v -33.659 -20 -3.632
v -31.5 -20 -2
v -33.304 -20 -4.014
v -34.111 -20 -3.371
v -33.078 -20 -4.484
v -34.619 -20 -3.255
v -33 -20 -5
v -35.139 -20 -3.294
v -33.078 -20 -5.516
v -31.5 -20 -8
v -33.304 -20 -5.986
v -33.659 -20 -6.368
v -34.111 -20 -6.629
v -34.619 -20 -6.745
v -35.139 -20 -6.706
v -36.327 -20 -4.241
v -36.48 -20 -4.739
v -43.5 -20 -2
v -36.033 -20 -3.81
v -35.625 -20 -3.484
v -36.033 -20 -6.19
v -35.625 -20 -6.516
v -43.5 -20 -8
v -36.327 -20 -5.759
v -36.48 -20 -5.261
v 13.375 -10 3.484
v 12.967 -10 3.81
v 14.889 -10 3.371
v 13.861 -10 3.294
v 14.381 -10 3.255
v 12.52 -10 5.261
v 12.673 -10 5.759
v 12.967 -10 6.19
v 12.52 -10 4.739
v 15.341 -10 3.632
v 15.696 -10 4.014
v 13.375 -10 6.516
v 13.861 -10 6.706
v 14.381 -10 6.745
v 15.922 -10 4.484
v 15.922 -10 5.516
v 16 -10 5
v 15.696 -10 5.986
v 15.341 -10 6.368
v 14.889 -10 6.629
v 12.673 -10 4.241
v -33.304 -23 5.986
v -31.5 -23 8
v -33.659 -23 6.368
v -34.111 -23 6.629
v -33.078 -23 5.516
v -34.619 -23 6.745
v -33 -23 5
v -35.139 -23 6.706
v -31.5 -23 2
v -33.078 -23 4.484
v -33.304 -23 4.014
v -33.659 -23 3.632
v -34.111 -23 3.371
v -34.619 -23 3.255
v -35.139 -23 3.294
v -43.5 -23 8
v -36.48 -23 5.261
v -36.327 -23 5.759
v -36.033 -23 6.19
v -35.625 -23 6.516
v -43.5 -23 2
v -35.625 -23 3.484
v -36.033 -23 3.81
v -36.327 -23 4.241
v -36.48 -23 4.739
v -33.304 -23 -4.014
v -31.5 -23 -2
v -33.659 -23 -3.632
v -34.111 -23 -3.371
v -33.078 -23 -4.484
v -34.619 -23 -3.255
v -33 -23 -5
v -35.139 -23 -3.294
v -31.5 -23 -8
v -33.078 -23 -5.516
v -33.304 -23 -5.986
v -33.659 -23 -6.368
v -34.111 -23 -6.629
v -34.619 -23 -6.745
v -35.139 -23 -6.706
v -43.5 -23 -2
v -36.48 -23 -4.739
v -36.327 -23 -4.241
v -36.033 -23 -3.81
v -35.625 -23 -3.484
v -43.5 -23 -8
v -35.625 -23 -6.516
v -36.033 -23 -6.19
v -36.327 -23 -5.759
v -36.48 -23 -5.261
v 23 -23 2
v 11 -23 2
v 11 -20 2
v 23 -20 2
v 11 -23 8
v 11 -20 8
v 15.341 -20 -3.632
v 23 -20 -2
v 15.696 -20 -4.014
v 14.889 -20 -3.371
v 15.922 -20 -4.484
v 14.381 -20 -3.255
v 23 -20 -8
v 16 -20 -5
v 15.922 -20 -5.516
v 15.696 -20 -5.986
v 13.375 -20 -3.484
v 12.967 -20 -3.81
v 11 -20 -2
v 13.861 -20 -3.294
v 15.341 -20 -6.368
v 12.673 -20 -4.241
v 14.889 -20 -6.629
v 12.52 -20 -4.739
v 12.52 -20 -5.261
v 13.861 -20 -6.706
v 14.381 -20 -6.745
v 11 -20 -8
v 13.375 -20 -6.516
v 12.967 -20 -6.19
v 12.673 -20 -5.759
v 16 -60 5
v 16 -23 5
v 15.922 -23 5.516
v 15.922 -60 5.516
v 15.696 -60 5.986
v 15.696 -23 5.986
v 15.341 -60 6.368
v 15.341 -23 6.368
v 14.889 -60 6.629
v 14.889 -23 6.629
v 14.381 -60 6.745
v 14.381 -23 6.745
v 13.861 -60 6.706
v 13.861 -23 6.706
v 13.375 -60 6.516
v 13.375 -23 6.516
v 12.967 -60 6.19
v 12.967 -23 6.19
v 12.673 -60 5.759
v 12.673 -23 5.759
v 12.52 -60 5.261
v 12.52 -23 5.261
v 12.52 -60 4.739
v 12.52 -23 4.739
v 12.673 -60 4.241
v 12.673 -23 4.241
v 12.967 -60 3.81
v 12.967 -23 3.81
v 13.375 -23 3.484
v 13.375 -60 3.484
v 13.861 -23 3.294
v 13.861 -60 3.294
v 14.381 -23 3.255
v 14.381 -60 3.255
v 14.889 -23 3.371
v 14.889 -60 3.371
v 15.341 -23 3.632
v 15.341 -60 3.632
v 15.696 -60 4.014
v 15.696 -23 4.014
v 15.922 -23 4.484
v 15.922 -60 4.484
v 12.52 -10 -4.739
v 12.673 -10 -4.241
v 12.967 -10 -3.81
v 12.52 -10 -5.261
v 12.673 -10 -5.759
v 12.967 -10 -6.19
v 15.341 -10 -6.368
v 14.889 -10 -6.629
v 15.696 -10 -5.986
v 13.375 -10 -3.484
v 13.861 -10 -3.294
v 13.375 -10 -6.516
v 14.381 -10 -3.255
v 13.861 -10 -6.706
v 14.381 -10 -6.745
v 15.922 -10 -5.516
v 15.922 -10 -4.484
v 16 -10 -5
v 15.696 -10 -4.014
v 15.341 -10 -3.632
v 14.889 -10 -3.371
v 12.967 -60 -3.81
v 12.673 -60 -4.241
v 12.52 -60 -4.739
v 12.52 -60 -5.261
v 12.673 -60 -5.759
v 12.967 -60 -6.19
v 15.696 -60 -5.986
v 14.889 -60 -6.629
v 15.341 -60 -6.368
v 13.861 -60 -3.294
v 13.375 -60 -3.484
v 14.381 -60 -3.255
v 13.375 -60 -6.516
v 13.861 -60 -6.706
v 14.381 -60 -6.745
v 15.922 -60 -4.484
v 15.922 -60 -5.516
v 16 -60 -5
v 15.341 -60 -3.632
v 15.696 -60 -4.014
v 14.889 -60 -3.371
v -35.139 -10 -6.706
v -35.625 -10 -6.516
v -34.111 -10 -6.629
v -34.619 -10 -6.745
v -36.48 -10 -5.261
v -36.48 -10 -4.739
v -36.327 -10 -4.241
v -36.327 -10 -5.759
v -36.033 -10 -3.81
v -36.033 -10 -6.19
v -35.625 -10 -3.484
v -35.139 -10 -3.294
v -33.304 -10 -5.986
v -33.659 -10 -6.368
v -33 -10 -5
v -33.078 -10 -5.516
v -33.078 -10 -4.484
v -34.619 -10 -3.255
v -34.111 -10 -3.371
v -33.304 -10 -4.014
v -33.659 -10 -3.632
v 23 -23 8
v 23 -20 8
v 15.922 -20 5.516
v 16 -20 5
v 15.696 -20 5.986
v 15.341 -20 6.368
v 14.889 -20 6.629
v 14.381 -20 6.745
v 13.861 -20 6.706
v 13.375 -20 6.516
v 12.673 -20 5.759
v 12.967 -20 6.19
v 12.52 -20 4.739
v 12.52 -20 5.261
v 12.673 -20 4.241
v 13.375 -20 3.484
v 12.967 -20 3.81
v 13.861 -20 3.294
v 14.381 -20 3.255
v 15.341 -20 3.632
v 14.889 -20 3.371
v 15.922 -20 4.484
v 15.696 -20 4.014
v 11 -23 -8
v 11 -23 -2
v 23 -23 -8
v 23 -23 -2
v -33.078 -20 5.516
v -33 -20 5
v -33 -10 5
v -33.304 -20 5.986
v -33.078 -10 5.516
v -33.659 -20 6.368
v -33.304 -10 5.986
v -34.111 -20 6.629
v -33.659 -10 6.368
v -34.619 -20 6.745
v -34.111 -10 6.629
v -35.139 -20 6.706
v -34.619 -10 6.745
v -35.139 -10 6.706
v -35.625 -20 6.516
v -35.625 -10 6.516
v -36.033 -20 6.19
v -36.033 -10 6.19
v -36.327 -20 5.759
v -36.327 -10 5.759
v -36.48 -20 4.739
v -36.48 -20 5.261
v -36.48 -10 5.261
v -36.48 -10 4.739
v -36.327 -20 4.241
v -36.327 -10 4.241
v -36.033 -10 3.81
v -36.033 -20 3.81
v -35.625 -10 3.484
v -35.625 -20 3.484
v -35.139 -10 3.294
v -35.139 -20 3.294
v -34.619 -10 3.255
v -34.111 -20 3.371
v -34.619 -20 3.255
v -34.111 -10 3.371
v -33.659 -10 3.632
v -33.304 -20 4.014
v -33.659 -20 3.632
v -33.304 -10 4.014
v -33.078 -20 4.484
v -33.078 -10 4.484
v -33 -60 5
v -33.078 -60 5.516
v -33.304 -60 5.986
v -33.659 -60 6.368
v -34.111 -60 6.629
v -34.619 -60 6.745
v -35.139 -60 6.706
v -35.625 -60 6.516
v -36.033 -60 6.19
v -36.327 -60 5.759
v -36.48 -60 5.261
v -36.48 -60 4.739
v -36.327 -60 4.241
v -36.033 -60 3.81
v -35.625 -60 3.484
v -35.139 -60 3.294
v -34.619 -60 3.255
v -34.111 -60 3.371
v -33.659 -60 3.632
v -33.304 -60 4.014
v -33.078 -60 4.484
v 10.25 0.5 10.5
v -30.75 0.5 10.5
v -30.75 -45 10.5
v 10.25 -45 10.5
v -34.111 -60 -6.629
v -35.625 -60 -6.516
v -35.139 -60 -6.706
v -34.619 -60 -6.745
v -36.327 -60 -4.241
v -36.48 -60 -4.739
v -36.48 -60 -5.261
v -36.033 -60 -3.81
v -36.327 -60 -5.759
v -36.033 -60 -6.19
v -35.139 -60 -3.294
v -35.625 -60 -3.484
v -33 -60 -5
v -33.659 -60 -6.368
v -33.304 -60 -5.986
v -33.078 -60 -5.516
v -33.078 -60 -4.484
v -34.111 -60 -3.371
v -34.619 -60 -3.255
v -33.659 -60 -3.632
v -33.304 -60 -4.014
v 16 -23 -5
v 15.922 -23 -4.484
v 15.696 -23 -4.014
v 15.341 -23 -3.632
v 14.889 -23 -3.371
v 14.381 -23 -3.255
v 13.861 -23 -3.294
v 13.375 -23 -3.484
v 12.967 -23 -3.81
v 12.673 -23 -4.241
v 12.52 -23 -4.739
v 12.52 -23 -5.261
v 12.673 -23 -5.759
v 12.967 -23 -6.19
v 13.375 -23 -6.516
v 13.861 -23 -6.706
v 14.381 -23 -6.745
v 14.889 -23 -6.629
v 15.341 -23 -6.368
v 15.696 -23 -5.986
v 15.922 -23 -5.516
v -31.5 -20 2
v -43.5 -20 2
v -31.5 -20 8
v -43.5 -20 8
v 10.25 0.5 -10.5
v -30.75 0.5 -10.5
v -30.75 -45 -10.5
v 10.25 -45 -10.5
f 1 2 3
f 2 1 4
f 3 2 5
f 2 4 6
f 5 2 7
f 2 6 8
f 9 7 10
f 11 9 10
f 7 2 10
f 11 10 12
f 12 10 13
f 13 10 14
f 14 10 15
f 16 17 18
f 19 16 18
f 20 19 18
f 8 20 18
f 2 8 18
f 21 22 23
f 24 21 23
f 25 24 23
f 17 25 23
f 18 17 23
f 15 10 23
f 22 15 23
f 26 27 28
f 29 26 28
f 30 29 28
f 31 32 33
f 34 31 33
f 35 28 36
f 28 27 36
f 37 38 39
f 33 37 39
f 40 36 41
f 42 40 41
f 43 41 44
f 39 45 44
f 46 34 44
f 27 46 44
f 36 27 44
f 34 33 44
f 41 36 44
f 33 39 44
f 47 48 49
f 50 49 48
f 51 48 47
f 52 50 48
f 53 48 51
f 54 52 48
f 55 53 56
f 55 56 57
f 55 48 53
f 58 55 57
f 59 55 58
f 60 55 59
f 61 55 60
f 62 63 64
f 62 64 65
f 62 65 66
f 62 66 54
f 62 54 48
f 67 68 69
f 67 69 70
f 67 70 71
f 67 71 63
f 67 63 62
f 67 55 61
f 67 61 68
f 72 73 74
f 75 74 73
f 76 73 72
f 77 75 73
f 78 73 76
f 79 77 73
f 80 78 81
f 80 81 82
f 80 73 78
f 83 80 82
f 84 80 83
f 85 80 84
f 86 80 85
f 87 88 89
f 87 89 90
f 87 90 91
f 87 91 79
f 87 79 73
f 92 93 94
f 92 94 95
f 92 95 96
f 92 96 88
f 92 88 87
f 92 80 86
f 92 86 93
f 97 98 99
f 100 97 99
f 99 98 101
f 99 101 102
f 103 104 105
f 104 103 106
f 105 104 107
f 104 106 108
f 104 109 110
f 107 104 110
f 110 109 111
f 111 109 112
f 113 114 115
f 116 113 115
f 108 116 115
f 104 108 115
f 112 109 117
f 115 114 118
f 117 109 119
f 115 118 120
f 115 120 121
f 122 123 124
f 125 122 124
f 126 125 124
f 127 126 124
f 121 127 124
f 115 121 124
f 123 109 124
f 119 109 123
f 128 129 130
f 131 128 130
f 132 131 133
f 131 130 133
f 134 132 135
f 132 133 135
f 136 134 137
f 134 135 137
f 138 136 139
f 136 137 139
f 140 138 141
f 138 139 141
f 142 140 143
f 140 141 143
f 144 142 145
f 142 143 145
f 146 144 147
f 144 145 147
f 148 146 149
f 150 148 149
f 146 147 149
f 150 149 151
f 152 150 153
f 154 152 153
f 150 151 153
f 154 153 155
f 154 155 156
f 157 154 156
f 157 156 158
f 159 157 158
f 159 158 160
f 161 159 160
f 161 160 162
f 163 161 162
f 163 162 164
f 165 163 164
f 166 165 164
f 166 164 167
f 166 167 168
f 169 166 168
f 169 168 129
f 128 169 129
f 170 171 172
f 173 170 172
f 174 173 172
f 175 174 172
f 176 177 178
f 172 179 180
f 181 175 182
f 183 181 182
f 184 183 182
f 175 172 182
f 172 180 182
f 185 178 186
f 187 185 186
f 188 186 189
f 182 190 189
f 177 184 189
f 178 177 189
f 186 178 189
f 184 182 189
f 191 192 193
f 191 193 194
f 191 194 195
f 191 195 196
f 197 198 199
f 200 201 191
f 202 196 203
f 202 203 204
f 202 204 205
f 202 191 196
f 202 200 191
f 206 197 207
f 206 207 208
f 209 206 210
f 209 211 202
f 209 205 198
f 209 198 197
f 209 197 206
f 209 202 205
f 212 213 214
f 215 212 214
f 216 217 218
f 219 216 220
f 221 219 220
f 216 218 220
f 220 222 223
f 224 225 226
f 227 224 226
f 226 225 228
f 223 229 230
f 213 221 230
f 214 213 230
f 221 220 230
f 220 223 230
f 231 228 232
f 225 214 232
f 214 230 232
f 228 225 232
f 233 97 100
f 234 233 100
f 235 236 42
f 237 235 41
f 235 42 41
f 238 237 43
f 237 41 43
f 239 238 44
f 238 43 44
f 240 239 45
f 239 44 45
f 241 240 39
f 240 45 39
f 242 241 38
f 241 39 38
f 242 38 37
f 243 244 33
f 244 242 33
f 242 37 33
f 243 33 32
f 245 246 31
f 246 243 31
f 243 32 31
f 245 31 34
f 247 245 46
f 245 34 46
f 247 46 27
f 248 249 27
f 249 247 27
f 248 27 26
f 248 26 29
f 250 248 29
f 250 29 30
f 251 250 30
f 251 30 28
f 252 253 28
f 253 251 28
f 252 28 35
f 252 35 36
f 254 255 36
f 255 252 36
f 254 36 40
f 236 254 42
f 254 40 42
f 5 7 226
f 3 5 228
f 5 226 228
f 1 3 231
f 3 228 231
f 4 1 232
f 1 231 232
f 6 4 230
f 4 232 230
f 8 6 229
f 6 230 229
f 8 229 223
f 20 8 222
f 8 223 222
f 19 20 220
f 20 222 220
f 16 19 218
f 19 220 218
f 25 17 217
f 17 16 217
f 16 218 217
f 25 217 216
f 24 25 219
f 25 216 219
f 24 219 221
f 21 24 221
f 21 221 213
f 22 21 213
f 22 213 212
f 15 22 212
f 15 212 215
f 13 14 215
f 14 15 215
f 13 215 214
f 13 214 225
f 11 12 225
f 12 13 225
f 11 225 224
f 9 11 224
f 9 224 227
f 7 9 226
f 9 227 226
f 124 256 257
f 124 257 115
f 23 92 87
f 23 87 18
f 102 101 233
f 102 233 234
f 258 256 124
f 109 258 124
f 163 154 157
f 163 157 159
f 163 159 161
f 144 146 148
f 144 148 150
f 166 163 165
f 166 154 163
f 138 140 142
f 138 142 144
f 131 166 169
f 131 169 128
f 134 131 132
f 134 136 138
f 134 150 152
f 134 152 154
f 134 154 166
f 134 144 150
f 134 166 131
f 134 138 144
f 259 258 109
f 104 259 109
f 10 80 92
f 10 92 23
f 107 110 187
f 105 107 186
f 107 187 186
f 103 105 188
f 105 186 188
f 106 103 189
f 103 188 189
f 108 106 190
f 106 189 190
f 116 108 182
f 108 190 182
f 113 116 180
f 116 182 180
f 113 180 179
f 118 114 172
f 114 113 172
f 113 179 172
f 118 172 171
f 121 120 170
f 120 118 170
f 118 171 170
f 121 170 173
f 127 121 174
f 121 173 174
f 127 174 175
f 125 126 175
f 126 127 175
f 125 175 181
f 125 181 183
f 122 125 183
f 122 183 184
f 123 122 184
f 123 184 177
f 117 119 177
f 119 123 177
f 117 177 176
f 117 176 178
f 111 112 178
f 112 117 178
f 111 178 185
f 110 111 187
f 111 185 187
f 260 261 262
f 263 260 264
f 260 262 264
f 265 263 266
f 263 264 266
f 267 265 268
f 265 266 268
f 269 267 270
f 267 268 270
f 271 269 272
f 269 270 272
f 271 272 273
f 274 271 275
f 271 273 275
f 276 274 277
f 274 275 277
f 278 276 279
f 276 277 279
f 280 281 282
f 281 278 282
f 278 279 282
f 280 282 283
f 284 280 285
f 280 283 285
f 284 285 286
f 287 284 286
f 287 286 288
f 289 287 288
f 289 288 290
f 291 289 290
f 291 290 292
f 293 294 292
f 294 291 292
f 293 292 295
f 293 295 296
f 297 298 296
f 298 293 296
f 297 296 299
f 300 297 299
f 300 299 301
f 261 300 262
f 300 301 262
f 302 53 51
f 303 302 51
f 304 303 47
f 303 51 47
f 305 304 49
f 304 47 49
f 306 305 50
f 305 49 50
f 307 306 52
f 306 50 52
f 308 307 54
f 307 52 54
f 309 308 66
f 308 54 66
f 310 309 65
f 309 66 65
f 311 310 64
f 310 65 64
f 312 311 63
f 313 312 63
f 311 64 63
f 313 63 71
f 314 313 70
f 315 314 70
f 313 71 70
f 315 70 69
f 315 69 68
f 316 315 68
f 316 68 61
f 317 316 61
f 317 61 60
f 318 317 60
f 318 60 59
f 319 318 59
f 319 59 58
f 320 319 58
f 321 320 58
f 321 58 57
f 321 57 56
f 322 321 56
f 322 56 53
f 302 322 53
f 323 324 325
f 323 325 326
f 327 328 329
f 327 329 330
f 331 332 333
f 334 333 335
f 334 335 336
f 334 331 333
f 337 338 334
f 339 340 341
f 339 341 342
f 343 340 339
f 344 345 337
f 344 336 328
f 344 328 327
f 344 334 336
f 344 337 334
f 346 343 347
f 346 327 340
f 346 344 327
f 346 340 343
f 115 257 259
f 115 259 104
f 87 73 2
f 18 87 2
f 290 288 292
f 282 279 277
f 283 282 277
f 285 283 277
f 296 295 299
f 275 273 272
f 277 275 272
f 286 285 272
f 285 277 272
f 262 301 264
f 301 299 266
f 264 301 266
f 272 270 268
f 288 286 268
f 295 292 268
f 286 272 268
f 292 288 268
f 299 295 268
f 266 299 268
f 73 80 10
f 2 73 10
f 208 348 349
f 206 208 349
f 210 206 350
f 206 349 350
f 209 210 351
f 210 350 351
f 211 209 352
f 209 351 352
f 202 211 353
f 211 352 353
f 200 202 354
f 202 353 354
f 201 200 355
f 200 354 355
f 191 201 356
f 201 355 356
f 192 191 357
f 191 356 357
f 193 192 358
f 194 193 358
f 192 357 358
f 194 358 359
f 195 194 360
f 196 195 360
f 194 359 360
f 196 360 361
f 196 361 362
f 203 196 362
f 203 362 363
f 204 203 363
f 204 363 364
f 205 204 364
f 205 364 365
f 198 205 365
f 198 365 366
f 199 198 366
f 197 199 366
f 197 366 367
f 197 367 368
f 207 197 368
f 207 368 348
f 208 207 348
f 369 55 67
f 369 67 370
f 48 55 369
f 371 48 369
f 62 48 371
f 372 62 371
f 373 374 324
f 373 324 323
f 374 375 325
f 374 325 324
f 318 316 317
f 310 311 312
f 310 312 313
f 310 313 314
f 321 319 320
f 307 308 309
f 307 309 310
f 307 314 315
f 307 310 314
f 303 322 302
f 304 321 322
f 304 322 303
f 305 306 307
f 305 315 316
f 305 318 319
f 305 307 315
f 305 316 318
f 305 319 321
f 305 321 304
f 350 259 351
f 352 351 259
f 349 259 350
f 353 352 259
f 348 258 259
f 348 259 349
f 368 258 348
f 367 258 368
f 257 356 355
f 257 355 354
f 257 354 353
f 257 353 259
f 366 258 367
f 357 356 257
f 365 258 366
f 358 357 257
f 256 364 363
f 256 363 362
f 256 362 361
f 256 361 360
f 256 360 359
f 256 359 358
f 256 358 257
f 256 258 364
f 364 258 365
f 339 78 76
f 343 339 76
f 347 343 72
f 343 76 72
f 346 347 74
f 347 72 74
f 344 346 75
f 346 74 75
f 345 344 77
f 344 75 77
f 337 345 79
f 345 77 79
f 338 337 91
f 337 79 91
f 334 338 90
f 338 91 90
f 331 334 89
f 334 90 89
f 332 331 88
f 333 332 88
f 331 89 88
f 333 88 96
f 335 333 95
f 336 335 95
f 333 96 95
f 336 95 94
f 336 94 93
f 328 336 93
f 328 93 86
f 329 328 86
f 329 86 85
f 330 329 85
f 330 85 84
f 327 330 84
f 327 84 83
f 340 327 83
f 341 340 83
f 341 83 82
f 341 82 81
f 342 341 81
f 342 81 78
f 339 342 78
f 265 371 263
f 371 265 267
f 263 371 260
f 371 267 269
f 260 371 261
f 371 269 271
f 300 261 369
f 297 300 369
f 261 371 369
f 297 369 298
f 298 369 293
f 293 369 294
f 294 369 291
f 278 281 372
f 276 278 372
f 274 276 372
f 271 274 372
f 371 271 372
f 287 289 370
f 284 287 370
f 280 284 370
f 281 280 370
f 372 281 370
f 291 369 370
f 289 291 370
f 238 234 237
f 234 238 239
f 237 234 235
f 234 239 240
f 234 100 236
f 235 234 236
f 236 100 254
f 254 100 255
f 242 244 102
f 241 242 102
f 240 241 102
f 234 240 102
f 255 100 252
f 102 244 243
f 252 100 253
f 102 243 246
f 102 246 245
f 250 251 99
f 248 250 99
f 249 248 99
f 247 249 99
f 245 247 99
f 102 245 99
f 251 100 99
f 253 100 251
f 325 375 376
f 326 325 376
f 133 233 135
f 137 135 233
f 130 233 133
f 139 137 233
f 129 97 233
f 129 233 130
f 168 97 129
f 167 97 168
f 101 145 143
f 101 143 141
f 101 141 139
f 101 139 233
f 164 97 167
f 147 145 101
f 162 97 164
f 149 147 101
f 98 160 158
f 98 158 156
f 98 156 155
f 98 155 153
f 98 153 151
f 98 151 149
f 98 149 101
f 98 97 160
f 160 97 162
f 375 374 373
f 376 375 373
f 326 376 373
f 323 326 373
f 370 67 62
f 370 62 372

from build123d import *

# Parameters (mm, degrees)
CYLINDER009_R          = 1.75
CYLINDER009_DEPTH      = 50
CYLINDER009_ROLL_ANGLE = 90
CYLINDER007_R          = 1.75
CYLINDER007_DEPTH      = 50
CYLINDER007_ROLL_ANGLE = 90
CYLINDER006_R          = 1.75
CYLINDER006_DEPTH      = 50
CYLINDER006_ROLL_ANGLE = 90
CYLINDER008_R          = 1.75
CYLINDER008_DEPTH      = 50
CYLINDER008_ROLL_ANGLE = 90
BOX012_W               = 3
BOX012_H               = 12
BOX012_DEPTH           = 6
BOX012_PLACEMENT_ANGLE = 90
BOX010_W               = 3
BOX010_H               = 12
BOX010_DEPTH           = 6
BOX010_PLACEMENT_ANGLE = 90
BOX009_W               = 3
BOX009_H               = 12
BOX009_DEPTH           = 6
BOX009_PLACEMENT_ANGLE = 90
BOX011_W               = 3
BOX011_H               = 12
BOX011_DEPTH           = 6
BOX011_PLACEMENT_ANGLE = 90
BOX004_W               = 41
BOX004_H               = 45.5
BOX004_DEPTH           = 21


with BuildPart() as cilindro009:
    # Cylinder009 → Cylinder009 (new body)
    with BuildSketch(Plane.XY):
        Circle(CYLINDER009_R)
    extrude(amount=CYLINDER009_DEPTH)


with BuildPart() as cilindro009_1:
    # Cylinder009 roll: moved
    add(cilindro009.part.rotate(Axis((0, 0, 0), (1, 0, 0)), CYLINDER009_ROLL_ANGLE))


with BuildPart() as cilindro009_2:
    # Cylinder009 placement: moved
    add(cilindro009_1.part.moved(Location((14.25, 0, 17))))


with BuildPart() as cilindro007:
    # Cylinder007 → Cylinder007 (new body)
    with BuildSketch(Plane.XY):
        Circle(CYLINDER007_R)
    extrude(amount=CYLINDER007_DEPTH)


with BuildPart() as cilindro007_1:
    # Cylinder007 roll: moved
    add(cilindro007.part.rotate(Axis((0, 0, 0), (1, 0, 0)), CYLINDER007_ROLL_ANGLE))


with BuildPart() as cilindro007_2:
    # Cylinder007 placement: moved
    add(cilindro007_1.part.moved(Location((14.25, 0, 7))))


with BuildPart() as cilindro006:
    # Cylinder006 → Cylinder006 (new body)
    with BuildSketch(Plane.XY):
        Circle(CYLINDER006_R)
    extrude(amount=CYLINDER006_DEPTH)


with BuildPart() as cilindro006_1:
    # Cylinder006 roll: moved
    add(cilindro006.part.rotate(Axis((0, 0, 0), (1, 0, 0)), CYLINDER006_ROLL_ANGLE))


with BuildPart() as cilindro006_2:
    # Cylinder006 placement: moved
    add(cilindro006_1.part.moved(Location((-34.75, 0, 7))))


with BuildPart() as fusion003:
    # Cylinder008 → Cylinder008 (new body)
    with BuildSketch(Plane.XY):
        Circle(CYLINDER008_R)
    extrude(amount=CYLINDER008_DEPTH)


with BuildPart() as fusion003_1:
    # Cylinder008 roll: moved
    add(fusion003.part.rotate(Axis((0, 0, 0), (1, 0, 0)), CYLINDER008_ROLL_ANGLE))


with BuildPart() as fusion003_2:
    # Cylinder008 placement: moved
    add(fusion003_1.part.moved(Location((-34.75, 0, 17))))

    # Fusion003: union Cilindro009, Cilindro007, Cilindro006
    add(cilindro009_2.part)
    add(cilindro007_2.part)
    add(cilindro006_2.part)


with BuildPart() as fusion003_3:
    # Fusion003 placement: moved
    add(fusion003_2.part.moved(Location((0, -10, -12))))


with BuildPart() as cube010:
    # Box012 → Box012 (new body)
    with BuildSketch(Plane.XY):
        with Locations((1.5, 6)):
            Rectangle(BOX012_W, BOX012_H)
    extrude(amount=BOX012_DEPTH)


with BuildPart() as cube010_1:
    # Box012 placement: moved
    add(cube010.part.moved(Location((-31.5, -20, -8))).rotate(Axis((-31.5, -20, -8), (0, 0, 1)), BOX012_PLACEMENT_ANGLE))


with BuildPart() as cube008:
    # Box010 → Box010 (new body)
    with BuildSketch(Plane.XY):
        with Locations((1.5, 6)):
            Rectangle(BOX010_W, BOX010_H)
    extrude(amount=BOX010_DEPTH)


with BuildPart() as cube008_1:
    # Box010 placement: moved
    add(cube008.part.moved(Location((23, -20, 2))).rotate(Axis((23, -20, 2), (0, 0, 1)), BOX010_PLACEMENT_ANGLE))


with BuildPart() as cube007:
    # Box009 → Box009 (new body)
    with BuildSketch(Plane.XY):
        with Locations((1.5, 6)):
            Rectangle(BOX009_W, BOX009_H)
    extrude(amount=BOX009_DEPTH)


with BuildPart() as cube007_1:
    # Box009 placement: moved
    add(cube007.part.moved(Location((23, -20, -8))).rotate(Axis((23, -20, -8), (0, 0, 1)), BOX009_PLACEMENT_ANGLE))


with BuildPart() as nuts_room:
    # Box011 → Box011 (new body)
    with BuildSketch(Plane.XY):
        with Locations((1.5, 6)):
            Rectangle(BOX011_W, BOX011_H)
    extrude(amount=BOX011_DEPTH)


with BuildPart() as nuts_room_1:
    # Box011 placement: moved
    add(nuts_room.part.moved(Location((-31.5, -20, 2))).rotate(Axis((-31.5, -20, 2), (0, 0, 1)), BOX011_PLACEMENT_ANGLE))

    # Fusion009: union Cube010, Cube008, Cube007
    add(cube010_1.part)
    add(cube008_1.part)
    add(cube007_1.part)


with BuildPart() as nuts_room_2:
    # Fusion009 placement: moved
    add(nuts_room_1.part.moved(Location((0, -3, 0))))


with BuildPart() as fusion010:
    # Box004 → Box004 (new body)
    with BuildSketch(Plane(origin=(-30.75, -45, -10.5), x_dir=(1, 0, 0), z_dir=(0, 0, 1))):
        with Locations((20.5, 22.75)):
            Rectangle(BOX004_W, BOX004_H)
    extrude(amount=BOX004_DEPTH)

    # Fusion010: union Fusion003, nuts_room
    add(fusion003_3.part)
    add(nuts_room_2.part)


solid = fusion010.part
